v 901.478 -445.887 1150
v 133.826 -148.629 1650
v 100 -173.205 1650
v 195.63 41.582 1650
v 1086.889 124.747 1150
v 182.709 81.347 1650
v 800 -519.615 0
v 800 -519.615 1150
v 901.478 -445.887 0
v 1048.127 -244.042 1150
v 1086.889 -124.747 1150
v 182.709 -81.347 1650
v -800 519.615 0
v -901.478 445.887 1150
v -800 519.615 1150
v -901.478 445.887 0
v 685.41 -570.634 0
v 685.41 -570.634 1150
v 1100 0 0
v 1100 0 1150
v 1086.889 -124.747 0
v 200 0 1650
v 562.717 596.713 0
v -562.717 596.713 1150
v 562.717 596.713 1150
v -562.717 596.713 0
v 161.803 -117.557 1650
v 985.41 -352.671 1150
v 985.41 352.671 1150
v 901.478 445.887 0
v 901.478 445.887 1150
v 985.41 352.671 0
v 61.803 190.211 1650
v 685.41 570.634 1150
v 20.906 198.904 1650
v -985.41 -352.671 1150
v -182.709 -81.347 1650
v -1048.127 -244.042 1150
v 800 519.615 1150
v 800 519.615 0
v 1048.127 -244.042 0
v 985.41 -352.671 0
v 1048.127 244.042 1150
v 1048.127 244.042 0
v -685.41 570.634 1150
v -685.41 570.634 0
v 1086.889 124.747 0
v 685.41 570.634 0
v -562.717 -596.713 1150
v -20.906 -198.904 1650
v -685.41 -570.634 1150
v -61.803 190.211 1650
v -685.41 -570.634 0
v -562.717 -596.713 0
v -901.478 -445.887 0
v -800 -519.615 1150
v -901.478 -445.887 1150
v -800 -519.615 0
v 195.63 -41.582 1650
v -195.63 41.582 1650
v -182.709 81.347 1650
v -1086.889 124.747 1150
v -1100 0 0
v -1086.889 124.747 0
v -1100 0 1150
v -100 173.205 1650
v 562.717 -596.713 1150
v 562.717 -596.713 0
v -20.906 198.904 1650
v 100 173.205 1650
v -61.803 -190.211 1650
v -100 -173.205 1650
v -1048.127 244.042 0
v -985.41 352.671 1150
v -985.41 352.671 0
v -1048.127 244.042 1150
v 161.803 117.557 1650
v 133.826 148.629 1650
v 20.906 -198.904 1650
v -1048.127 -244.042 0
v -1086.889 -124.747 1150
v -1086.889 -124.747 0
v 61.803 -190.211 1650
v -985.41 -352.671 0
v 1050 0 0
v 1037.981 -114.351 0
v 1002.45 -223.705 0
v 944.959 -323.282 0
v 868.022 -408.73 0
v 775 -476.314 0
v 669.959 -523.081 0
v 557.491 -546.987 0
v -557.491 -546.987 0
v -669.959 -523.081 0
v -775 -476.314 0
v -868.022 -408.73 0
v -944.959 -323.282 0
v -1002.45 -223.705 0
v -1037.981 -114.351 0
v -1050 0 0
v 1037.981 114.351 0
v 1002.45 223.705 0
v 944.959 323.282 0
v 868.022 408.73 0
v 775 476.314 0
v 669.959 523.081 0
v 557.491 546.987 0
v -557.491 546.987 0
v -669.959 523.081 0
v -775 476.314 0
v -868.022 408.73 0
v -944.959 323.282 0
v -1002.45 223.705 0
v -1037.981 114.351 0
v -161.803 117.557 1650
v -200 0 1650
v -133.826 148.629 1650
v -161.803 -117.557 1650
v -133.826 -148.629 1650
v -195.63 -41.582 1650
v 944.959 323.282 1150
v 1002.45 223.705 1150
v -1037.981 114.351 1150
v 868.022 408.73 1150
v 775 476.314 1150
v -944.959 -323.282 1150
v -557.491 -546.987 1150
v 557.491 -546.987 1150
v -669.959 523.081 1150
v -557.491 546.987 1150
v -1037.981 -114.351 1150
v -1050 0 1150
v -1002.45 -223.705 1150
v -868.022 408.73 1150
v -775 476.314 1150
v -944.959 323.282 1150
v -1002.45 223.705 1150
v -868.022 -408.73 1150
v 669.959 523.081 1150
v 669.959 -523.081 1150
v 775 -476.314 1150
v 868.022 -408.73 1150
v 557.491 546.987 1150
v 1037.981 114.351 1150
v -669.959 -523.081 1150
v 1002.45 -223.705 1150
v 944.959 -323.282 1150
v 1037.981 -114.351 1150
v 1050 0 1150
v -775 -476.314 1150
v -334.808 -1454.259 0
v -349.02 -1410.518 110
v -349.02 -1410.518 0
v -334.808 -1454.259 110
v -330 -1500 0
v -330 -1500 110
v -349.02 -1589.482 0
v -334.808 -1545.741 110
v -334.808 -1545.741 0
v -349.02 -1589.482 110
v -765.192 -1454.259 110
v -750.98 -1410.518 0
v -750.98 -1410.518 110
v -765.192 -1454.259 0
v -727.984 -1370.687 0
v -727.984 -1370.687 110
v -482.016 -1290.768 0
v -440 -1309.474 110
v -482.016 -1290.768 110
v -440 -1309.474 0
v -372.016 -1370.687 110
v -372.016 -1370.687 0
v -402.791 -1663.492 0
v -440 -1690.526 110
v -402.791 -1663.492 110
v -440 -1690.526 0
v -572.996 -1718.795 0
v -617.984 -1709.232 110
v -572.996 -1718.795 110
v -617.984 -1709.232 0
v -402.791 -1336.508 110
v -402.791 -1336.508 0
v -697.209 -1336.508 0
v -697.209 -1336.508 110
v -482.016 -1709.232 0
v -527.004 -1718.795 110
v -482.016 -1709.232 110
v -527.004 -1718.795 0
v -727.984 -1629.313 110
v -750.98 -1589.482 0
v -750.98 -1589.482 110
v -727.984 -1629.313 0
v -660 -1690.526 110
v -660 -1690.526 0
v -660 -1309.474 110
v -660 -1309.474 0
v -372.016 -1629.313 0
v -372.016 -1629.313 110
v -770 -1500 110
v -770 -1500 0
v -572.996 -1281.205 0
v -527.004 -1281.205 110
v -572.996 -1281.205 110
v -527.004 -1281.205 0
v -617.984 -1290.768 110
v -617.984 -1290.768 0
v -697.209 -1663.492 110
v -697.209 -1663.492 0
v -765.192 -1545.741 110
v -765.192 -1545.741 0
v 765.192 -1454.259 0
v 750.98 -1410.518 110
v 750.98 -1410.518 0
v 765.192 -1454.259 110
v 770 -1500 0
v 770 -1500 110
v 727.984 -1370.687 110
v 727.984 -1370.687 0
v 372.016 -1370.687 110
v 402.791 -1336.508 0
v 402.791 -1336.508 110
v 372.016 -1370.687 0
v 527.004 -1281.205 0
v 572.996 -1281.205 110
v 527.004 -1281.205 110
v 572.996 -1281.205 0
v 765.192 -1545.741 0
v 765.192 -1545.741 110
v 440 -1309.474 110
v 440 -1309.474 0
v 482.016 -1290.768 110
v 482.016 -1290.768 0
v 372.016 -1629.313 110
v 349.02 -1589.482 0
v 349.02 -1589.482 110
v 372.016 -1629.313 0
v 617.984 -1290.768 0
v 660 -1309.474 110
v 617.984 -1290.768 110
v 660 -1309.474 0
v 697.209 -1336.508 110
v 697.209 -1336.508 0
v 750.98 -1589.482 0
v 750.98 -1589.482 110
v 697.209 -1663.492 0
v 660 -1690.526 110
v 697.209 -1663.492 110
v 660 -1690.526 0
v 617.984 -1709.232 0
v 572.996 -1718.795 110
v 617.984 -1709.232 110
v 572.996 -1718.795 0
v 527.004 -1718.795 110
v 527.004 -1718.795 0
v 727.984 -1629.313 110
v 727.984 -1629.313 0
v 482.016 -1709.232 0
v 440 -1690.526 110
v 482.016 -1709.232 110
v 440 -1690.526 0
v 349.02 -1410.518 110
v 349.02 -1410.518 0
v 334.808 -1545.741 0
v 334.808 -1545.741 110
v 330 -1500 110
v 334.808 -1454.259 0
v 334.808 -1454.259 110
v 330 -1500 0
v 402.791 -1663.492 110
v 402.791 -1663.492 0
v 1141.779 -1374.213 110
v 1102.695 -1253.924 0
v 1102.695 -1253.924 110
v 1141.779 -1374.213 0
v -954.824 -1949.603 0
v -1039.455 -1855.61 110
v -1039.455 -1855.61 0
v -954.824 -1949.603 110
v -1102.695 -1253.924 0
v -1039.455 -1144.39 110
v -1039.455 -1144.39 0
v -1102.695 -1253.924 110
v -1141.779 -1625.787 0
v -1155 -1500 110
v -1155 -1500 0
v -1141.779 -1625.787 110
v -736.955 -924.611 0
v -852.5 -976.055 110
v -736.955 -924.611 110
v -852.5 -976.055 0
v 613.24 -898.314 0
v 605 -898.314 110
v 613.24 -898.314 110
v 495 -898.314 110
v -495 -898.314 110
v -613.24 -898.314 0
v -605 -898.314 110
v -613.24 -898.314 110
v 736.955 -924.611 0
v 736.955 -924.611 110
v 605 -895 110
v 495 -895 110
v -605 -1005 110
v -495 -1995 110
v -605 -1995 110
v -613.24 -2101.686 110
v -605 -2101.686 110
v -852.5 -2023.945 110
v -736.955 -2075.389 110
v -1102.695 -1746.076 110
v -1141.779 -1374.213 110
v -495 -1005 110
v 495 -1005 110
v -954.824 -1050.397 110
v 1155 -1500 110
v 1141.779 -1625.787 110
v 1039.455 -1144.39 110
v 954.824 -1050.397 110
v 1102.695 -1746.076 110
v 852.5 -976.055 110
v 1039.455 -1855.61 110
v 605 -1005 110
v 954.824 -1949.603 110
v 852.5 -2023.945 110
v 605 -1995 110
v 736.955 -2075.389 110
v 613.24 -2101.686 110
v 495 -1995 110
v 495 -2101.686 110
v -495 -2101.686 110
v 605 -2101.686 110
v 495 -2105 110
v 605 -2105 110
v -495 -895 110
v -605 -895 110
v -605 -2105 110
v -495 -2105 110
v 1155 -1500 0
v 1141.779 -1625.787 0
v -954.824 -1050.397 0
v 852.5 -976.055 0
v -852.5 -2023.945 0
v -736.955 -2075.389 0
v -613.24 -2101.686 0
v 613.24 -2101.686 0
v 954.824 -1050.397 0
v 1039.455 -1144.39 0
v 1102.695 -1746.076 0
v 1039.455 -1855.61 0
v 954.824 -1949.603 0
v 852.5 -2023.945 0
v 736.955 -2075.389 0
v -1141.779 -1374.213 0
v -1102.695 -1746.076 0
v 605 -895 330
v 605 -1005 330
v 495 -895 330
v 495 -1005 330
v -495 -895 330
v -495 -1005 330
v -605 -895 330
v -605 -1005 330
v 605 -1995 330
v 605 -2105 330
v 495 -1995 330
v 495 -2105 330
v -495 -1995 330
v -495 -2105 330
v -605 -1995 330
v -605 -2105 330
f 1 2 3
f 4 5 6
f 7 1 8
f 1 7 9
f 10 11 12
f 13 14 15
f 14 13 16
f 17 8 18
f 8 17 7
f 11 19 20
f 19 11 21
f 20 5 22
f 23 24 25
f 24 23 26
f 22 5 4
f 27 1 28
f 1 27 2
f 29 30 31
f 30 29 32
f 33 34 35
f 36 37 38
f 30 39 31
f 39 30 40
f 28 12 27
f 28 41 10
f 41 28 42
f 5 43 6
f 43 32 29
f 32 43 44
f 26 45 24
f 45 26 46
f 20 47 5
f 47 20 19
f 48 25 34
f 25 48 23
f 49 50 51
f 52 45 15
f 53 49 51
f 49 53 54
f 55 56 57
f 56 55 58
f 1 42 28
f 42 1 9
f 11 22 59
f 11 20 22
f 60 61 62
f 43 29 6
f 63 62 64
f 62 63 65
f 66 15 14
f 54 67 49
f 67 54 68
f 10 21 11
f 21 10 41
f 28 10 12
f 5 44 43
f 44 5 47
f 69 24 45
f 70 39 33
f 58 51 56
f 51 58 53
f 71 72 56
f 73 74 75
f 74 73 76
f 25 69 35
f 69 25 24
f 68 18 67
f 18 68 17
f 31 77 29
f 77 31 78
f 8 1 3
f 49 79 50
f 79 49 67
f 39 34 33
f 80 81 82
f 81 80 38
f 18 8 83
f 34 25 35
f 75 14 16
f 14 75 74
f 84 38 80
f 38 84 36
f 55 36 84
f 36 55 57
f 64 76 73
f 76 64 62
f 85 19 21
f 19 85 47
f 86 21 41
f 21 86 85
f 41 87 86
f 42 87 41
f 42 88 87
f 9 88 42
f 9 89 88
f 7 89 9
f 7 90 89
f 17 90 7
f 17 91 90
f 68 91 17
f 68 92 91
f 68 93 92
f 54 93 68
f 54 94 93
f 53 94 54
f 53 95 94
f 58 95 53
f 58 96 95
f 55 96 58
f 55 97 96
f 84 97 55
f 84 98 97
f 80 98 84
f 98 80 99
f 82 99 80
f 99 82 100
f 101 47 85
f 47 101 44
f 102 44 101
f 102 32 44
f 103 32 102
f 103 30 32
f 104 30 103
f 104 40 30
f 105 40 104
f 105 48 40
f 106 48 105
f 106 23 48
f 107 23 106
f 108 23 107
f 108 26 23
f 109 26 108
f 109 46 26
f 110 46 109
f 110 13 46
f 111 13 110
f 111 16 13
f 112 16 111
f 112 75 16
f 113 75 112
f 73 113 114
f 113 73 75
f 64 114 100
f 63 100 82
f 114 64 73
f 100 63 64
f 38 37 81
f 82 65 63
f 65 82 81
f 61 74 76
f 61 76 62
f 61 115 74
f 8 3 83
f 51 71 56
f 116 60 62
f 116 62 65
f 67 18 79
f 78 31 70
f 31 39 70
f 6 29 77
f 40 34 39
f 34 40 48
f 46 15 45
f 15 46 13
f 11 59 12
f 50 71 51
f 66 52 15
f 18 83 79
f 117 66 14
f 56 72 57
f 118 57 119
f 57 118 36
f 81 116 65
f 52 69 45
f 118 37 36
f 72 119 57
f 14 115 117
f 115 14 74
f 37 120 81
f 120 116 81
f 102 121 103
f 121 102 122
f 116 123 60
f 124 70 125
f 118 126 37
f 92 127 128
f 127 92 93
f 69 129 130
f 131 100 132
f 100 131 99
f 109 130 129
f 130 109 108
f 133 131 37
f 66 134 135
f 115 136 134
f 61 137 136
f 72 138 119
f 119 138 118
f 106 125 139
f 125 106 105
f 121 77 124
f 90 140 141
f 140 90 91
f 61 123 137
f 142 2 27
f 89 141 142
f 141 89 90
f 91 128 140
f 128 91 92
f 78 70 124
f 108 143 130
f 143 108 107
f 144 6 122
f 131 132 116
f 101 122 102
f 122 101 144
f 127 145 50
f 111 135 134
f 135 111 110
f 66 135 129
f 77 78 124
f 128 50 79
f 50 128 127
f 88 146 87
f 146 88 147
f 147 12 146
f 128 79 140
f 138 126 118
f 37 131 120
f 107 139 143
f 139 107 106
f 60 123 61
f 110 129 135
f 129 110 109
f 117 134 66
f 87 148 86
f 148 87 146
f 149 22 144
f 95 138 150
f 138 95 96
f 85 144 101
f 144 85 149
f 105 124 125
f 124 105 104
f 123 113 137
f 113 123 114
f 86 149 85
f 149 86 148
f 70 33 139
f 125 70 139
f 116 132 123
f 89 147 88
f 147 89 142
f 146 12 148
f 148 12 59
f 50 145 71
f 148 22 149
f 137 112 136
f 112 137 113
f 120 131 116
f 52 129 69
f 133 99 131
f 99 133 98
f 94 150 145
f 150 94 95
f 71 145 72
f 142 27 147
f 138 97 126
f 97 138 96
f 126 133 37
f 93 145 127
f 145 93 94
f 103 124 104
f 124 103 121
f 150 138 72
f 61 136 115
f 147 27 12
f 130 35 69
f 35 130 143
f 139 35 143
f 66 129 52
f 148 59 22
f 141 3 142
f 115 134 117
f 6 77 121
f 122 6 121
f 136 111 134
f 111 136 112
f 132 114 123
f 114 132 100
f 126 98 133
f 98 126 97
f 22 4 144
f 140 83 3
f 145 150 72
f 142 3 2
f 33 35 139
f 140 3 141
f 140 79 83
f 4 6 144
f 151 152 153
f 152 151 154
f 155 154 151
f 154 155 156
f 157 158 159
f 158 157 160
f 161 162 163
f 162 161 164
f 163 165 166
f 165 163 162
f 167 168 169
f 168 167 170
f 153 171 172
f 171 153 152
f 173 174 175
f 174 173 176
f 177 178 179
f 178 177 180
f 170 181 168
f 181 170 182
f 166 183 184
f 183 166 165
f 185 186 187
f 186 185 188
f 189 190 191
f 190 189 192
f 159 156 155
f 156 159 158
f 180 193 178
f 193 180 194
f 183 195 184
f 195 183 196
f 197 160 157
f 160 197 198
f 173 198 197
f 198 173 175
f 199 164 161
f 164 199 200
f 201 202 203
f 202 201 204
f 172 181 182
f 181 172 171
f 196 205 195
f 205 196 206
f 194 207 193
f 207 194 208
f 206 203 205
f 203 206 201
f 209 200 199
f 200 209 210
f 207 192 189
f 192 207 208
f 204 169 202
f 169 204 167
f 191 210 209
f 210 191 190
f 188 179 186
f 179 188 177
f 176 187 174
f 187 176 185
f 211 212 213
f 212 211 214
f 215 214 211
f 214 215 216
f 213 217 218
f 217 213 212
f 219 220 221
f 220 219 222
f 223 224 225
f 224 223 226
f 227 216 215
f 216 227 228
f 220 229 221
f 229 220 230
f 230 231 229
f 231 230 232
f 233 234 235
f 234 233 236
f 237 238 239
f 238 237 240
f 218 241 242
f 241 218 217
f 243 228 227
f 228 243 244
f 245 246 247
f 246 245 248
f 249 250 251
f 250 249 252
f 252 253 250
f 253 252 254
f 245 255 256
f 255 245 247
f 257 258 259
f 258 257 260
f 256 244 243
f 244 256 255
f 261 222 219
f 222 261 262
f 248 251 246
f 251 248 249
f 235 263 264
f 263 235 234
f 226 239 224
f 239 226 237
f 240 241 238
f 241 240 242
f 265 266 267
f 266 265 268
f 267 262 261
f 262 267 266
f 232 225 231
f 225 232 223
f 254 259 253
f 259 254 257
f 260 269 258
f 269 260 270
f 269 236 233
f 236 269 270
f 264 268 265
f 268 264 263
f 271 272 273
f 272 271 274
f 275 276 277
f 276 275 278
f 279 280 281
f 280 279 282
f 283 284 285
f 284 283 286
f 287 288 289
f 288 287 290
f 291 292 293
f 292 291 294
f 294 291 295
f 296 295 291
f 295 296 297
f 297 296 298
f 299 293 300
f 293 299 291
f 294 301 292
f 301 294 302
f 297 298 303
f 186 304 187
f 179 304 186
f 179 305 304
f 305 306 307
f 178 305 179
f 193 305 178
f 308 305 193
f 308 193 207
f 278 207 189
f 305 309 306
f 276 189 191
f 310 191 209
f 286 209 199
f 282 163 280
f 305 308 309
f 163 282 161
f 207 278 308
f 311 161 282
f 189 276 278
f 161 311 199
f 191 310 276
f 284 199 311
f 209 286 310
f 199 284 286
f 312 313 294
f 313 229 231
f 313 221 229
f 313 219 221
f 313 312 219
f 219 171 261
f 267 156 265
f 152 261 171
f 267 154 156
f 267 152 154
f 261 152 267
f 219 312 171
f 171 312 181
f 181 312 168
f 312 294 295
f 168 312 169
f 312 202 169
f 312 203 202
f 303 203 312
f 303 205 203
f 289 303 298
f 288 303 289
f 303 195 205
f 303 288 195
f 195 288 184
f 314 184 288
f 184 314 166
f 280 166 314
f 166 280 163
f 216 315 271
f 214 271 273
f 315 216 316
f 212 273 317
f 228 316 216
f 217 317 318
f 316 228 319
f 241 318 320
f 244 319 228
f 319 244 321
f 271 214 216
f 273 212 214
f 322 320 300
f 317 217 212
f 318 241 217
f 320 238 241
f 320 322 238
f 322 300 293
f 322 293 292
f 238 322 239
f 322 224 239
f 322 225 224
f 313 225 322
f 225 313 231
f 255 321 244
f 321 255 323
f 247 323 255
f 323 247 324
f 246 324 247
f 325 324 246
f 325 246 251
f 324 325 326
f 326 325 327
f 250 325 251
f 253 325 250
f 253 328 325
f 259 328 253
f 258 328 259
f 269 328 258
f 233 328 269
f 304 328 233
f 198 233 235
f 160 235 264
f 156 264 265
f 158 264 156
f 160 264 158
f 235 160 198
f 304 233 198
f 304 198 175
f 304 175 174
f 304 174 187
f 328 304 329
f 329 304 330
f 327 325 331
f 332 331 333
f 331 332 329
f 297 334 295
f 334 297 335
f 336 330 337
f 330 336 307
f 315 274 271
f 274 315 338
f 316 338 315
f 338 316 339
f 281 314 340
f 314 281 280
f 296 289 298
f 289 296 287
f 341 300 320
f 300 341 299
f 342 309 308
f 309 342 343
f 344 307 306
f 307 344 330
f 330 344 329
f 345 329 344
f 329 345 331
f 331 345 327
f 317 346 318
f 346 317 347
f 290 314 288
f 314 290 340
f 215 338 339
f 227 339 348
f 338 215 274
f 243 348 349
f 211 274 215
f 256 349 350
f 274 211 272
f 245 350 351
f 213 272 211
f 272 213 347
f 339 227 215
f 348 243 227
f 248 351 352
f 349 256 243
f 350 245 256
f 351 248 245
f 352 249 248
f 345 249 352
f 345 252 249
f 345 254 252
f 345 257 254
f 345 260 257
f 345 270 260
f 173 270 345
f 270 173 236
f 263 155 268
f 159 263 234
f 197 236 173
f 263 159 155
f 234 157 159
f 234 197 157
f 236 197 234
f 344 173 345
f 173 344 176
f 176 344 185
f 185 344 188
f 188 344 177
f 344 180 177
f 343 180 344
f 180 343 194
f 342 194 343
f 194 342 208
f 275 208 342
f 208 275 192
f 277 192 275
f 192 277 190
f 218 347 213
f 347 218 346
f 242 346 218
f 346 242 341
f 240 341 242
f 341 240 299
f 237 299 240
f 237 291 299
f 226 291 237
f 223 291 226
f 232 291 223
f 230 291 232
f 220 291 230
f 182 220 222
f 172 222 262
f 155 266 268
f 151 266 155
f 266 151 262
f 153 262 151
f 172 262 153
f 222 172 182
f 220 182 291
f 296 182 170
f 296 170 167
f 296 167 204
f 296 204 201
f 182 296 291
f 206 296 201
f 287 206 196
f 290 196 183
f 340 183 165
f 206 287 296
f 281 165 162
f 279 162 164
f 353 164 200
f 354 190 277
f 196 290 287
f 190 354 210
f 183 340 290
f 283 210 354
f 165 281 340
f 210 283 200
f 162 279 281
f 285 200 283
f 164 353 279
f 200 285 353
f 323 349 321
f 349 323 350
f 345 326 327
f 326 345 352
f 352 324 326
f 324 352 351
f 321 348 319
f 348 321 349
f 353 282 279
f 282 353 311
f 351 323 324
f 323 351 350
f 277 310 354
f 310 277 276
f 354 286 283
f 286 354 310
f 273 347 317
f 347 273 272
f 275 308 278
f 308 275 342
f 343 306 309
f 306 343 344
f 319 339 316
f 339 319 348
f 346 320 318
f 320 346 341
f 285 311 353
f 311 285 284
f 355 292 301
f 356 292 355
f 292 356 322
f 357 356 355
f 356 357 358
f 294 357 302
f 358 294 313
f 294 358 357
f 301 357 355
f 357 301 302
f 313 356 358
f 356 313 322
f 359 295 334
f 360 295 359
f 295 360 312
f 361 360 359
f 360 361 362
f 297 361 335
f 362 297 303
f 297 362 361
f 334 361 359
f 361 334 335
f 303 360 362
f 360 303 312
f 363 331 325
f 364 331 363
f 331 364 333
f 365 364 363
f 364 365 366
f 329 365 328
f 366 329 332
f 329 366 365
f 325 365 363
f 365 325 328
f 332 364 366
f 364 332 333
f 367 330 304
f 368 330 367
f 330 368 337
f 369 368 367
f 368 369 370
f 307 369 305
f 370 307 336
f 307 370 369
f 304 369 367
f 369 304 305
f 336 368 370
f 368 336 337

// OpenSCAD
axis_offset = 500;
body_height = 1050;
inner_radius = 550;
outer_radius = 600;

module cylinders(h, r, d) {
  translate([-1*d, 0, 0]) cylinder(h, r=r);
  translate([d, 0, 0]) cylinder(h, r=r);
}

module body(h, r, d) {
  hull() {
    cylinders(h, r, d);
  }
}
module funnel(h, r, d, o) {
  hull() {
    cylinders(h, r, d);
    translate([0, 0, -1*d]) cylinder(600, o, o);
  }
}

mirror([0,0,1])translate([0,0,-1150])difference() {
  funnel(1150, outer_radius, 500, 200); // outer shell
  funnel(1050, inner_radius, 500, 200); // inner shell

  translate([0,0,1150])mirror([0,0,1])
    body(1050, inner_radius, 500); // opening

  translate([0,0,-800])cylinder(500, 200, 200); // hole
}

module tab() {
  w = 100;
  h = 100;
  l = 200;
  cube([w, h, l]);
}

translate([0, -1500, 0]) scale(1.1) {
  difference() {
	  hull() {	cylinders(100, 550, 500); } 			// cap
	  translate([0,0,-50])cylinders(200, 200, 500); // holes
  }
  translate([0,0,100]) {
    translate([450,450,0])tab();
    translate([-550,450,0])tab();
    translate([450,-550,0])tab();
    translate([-550,-550,0])tab();
  }
}
